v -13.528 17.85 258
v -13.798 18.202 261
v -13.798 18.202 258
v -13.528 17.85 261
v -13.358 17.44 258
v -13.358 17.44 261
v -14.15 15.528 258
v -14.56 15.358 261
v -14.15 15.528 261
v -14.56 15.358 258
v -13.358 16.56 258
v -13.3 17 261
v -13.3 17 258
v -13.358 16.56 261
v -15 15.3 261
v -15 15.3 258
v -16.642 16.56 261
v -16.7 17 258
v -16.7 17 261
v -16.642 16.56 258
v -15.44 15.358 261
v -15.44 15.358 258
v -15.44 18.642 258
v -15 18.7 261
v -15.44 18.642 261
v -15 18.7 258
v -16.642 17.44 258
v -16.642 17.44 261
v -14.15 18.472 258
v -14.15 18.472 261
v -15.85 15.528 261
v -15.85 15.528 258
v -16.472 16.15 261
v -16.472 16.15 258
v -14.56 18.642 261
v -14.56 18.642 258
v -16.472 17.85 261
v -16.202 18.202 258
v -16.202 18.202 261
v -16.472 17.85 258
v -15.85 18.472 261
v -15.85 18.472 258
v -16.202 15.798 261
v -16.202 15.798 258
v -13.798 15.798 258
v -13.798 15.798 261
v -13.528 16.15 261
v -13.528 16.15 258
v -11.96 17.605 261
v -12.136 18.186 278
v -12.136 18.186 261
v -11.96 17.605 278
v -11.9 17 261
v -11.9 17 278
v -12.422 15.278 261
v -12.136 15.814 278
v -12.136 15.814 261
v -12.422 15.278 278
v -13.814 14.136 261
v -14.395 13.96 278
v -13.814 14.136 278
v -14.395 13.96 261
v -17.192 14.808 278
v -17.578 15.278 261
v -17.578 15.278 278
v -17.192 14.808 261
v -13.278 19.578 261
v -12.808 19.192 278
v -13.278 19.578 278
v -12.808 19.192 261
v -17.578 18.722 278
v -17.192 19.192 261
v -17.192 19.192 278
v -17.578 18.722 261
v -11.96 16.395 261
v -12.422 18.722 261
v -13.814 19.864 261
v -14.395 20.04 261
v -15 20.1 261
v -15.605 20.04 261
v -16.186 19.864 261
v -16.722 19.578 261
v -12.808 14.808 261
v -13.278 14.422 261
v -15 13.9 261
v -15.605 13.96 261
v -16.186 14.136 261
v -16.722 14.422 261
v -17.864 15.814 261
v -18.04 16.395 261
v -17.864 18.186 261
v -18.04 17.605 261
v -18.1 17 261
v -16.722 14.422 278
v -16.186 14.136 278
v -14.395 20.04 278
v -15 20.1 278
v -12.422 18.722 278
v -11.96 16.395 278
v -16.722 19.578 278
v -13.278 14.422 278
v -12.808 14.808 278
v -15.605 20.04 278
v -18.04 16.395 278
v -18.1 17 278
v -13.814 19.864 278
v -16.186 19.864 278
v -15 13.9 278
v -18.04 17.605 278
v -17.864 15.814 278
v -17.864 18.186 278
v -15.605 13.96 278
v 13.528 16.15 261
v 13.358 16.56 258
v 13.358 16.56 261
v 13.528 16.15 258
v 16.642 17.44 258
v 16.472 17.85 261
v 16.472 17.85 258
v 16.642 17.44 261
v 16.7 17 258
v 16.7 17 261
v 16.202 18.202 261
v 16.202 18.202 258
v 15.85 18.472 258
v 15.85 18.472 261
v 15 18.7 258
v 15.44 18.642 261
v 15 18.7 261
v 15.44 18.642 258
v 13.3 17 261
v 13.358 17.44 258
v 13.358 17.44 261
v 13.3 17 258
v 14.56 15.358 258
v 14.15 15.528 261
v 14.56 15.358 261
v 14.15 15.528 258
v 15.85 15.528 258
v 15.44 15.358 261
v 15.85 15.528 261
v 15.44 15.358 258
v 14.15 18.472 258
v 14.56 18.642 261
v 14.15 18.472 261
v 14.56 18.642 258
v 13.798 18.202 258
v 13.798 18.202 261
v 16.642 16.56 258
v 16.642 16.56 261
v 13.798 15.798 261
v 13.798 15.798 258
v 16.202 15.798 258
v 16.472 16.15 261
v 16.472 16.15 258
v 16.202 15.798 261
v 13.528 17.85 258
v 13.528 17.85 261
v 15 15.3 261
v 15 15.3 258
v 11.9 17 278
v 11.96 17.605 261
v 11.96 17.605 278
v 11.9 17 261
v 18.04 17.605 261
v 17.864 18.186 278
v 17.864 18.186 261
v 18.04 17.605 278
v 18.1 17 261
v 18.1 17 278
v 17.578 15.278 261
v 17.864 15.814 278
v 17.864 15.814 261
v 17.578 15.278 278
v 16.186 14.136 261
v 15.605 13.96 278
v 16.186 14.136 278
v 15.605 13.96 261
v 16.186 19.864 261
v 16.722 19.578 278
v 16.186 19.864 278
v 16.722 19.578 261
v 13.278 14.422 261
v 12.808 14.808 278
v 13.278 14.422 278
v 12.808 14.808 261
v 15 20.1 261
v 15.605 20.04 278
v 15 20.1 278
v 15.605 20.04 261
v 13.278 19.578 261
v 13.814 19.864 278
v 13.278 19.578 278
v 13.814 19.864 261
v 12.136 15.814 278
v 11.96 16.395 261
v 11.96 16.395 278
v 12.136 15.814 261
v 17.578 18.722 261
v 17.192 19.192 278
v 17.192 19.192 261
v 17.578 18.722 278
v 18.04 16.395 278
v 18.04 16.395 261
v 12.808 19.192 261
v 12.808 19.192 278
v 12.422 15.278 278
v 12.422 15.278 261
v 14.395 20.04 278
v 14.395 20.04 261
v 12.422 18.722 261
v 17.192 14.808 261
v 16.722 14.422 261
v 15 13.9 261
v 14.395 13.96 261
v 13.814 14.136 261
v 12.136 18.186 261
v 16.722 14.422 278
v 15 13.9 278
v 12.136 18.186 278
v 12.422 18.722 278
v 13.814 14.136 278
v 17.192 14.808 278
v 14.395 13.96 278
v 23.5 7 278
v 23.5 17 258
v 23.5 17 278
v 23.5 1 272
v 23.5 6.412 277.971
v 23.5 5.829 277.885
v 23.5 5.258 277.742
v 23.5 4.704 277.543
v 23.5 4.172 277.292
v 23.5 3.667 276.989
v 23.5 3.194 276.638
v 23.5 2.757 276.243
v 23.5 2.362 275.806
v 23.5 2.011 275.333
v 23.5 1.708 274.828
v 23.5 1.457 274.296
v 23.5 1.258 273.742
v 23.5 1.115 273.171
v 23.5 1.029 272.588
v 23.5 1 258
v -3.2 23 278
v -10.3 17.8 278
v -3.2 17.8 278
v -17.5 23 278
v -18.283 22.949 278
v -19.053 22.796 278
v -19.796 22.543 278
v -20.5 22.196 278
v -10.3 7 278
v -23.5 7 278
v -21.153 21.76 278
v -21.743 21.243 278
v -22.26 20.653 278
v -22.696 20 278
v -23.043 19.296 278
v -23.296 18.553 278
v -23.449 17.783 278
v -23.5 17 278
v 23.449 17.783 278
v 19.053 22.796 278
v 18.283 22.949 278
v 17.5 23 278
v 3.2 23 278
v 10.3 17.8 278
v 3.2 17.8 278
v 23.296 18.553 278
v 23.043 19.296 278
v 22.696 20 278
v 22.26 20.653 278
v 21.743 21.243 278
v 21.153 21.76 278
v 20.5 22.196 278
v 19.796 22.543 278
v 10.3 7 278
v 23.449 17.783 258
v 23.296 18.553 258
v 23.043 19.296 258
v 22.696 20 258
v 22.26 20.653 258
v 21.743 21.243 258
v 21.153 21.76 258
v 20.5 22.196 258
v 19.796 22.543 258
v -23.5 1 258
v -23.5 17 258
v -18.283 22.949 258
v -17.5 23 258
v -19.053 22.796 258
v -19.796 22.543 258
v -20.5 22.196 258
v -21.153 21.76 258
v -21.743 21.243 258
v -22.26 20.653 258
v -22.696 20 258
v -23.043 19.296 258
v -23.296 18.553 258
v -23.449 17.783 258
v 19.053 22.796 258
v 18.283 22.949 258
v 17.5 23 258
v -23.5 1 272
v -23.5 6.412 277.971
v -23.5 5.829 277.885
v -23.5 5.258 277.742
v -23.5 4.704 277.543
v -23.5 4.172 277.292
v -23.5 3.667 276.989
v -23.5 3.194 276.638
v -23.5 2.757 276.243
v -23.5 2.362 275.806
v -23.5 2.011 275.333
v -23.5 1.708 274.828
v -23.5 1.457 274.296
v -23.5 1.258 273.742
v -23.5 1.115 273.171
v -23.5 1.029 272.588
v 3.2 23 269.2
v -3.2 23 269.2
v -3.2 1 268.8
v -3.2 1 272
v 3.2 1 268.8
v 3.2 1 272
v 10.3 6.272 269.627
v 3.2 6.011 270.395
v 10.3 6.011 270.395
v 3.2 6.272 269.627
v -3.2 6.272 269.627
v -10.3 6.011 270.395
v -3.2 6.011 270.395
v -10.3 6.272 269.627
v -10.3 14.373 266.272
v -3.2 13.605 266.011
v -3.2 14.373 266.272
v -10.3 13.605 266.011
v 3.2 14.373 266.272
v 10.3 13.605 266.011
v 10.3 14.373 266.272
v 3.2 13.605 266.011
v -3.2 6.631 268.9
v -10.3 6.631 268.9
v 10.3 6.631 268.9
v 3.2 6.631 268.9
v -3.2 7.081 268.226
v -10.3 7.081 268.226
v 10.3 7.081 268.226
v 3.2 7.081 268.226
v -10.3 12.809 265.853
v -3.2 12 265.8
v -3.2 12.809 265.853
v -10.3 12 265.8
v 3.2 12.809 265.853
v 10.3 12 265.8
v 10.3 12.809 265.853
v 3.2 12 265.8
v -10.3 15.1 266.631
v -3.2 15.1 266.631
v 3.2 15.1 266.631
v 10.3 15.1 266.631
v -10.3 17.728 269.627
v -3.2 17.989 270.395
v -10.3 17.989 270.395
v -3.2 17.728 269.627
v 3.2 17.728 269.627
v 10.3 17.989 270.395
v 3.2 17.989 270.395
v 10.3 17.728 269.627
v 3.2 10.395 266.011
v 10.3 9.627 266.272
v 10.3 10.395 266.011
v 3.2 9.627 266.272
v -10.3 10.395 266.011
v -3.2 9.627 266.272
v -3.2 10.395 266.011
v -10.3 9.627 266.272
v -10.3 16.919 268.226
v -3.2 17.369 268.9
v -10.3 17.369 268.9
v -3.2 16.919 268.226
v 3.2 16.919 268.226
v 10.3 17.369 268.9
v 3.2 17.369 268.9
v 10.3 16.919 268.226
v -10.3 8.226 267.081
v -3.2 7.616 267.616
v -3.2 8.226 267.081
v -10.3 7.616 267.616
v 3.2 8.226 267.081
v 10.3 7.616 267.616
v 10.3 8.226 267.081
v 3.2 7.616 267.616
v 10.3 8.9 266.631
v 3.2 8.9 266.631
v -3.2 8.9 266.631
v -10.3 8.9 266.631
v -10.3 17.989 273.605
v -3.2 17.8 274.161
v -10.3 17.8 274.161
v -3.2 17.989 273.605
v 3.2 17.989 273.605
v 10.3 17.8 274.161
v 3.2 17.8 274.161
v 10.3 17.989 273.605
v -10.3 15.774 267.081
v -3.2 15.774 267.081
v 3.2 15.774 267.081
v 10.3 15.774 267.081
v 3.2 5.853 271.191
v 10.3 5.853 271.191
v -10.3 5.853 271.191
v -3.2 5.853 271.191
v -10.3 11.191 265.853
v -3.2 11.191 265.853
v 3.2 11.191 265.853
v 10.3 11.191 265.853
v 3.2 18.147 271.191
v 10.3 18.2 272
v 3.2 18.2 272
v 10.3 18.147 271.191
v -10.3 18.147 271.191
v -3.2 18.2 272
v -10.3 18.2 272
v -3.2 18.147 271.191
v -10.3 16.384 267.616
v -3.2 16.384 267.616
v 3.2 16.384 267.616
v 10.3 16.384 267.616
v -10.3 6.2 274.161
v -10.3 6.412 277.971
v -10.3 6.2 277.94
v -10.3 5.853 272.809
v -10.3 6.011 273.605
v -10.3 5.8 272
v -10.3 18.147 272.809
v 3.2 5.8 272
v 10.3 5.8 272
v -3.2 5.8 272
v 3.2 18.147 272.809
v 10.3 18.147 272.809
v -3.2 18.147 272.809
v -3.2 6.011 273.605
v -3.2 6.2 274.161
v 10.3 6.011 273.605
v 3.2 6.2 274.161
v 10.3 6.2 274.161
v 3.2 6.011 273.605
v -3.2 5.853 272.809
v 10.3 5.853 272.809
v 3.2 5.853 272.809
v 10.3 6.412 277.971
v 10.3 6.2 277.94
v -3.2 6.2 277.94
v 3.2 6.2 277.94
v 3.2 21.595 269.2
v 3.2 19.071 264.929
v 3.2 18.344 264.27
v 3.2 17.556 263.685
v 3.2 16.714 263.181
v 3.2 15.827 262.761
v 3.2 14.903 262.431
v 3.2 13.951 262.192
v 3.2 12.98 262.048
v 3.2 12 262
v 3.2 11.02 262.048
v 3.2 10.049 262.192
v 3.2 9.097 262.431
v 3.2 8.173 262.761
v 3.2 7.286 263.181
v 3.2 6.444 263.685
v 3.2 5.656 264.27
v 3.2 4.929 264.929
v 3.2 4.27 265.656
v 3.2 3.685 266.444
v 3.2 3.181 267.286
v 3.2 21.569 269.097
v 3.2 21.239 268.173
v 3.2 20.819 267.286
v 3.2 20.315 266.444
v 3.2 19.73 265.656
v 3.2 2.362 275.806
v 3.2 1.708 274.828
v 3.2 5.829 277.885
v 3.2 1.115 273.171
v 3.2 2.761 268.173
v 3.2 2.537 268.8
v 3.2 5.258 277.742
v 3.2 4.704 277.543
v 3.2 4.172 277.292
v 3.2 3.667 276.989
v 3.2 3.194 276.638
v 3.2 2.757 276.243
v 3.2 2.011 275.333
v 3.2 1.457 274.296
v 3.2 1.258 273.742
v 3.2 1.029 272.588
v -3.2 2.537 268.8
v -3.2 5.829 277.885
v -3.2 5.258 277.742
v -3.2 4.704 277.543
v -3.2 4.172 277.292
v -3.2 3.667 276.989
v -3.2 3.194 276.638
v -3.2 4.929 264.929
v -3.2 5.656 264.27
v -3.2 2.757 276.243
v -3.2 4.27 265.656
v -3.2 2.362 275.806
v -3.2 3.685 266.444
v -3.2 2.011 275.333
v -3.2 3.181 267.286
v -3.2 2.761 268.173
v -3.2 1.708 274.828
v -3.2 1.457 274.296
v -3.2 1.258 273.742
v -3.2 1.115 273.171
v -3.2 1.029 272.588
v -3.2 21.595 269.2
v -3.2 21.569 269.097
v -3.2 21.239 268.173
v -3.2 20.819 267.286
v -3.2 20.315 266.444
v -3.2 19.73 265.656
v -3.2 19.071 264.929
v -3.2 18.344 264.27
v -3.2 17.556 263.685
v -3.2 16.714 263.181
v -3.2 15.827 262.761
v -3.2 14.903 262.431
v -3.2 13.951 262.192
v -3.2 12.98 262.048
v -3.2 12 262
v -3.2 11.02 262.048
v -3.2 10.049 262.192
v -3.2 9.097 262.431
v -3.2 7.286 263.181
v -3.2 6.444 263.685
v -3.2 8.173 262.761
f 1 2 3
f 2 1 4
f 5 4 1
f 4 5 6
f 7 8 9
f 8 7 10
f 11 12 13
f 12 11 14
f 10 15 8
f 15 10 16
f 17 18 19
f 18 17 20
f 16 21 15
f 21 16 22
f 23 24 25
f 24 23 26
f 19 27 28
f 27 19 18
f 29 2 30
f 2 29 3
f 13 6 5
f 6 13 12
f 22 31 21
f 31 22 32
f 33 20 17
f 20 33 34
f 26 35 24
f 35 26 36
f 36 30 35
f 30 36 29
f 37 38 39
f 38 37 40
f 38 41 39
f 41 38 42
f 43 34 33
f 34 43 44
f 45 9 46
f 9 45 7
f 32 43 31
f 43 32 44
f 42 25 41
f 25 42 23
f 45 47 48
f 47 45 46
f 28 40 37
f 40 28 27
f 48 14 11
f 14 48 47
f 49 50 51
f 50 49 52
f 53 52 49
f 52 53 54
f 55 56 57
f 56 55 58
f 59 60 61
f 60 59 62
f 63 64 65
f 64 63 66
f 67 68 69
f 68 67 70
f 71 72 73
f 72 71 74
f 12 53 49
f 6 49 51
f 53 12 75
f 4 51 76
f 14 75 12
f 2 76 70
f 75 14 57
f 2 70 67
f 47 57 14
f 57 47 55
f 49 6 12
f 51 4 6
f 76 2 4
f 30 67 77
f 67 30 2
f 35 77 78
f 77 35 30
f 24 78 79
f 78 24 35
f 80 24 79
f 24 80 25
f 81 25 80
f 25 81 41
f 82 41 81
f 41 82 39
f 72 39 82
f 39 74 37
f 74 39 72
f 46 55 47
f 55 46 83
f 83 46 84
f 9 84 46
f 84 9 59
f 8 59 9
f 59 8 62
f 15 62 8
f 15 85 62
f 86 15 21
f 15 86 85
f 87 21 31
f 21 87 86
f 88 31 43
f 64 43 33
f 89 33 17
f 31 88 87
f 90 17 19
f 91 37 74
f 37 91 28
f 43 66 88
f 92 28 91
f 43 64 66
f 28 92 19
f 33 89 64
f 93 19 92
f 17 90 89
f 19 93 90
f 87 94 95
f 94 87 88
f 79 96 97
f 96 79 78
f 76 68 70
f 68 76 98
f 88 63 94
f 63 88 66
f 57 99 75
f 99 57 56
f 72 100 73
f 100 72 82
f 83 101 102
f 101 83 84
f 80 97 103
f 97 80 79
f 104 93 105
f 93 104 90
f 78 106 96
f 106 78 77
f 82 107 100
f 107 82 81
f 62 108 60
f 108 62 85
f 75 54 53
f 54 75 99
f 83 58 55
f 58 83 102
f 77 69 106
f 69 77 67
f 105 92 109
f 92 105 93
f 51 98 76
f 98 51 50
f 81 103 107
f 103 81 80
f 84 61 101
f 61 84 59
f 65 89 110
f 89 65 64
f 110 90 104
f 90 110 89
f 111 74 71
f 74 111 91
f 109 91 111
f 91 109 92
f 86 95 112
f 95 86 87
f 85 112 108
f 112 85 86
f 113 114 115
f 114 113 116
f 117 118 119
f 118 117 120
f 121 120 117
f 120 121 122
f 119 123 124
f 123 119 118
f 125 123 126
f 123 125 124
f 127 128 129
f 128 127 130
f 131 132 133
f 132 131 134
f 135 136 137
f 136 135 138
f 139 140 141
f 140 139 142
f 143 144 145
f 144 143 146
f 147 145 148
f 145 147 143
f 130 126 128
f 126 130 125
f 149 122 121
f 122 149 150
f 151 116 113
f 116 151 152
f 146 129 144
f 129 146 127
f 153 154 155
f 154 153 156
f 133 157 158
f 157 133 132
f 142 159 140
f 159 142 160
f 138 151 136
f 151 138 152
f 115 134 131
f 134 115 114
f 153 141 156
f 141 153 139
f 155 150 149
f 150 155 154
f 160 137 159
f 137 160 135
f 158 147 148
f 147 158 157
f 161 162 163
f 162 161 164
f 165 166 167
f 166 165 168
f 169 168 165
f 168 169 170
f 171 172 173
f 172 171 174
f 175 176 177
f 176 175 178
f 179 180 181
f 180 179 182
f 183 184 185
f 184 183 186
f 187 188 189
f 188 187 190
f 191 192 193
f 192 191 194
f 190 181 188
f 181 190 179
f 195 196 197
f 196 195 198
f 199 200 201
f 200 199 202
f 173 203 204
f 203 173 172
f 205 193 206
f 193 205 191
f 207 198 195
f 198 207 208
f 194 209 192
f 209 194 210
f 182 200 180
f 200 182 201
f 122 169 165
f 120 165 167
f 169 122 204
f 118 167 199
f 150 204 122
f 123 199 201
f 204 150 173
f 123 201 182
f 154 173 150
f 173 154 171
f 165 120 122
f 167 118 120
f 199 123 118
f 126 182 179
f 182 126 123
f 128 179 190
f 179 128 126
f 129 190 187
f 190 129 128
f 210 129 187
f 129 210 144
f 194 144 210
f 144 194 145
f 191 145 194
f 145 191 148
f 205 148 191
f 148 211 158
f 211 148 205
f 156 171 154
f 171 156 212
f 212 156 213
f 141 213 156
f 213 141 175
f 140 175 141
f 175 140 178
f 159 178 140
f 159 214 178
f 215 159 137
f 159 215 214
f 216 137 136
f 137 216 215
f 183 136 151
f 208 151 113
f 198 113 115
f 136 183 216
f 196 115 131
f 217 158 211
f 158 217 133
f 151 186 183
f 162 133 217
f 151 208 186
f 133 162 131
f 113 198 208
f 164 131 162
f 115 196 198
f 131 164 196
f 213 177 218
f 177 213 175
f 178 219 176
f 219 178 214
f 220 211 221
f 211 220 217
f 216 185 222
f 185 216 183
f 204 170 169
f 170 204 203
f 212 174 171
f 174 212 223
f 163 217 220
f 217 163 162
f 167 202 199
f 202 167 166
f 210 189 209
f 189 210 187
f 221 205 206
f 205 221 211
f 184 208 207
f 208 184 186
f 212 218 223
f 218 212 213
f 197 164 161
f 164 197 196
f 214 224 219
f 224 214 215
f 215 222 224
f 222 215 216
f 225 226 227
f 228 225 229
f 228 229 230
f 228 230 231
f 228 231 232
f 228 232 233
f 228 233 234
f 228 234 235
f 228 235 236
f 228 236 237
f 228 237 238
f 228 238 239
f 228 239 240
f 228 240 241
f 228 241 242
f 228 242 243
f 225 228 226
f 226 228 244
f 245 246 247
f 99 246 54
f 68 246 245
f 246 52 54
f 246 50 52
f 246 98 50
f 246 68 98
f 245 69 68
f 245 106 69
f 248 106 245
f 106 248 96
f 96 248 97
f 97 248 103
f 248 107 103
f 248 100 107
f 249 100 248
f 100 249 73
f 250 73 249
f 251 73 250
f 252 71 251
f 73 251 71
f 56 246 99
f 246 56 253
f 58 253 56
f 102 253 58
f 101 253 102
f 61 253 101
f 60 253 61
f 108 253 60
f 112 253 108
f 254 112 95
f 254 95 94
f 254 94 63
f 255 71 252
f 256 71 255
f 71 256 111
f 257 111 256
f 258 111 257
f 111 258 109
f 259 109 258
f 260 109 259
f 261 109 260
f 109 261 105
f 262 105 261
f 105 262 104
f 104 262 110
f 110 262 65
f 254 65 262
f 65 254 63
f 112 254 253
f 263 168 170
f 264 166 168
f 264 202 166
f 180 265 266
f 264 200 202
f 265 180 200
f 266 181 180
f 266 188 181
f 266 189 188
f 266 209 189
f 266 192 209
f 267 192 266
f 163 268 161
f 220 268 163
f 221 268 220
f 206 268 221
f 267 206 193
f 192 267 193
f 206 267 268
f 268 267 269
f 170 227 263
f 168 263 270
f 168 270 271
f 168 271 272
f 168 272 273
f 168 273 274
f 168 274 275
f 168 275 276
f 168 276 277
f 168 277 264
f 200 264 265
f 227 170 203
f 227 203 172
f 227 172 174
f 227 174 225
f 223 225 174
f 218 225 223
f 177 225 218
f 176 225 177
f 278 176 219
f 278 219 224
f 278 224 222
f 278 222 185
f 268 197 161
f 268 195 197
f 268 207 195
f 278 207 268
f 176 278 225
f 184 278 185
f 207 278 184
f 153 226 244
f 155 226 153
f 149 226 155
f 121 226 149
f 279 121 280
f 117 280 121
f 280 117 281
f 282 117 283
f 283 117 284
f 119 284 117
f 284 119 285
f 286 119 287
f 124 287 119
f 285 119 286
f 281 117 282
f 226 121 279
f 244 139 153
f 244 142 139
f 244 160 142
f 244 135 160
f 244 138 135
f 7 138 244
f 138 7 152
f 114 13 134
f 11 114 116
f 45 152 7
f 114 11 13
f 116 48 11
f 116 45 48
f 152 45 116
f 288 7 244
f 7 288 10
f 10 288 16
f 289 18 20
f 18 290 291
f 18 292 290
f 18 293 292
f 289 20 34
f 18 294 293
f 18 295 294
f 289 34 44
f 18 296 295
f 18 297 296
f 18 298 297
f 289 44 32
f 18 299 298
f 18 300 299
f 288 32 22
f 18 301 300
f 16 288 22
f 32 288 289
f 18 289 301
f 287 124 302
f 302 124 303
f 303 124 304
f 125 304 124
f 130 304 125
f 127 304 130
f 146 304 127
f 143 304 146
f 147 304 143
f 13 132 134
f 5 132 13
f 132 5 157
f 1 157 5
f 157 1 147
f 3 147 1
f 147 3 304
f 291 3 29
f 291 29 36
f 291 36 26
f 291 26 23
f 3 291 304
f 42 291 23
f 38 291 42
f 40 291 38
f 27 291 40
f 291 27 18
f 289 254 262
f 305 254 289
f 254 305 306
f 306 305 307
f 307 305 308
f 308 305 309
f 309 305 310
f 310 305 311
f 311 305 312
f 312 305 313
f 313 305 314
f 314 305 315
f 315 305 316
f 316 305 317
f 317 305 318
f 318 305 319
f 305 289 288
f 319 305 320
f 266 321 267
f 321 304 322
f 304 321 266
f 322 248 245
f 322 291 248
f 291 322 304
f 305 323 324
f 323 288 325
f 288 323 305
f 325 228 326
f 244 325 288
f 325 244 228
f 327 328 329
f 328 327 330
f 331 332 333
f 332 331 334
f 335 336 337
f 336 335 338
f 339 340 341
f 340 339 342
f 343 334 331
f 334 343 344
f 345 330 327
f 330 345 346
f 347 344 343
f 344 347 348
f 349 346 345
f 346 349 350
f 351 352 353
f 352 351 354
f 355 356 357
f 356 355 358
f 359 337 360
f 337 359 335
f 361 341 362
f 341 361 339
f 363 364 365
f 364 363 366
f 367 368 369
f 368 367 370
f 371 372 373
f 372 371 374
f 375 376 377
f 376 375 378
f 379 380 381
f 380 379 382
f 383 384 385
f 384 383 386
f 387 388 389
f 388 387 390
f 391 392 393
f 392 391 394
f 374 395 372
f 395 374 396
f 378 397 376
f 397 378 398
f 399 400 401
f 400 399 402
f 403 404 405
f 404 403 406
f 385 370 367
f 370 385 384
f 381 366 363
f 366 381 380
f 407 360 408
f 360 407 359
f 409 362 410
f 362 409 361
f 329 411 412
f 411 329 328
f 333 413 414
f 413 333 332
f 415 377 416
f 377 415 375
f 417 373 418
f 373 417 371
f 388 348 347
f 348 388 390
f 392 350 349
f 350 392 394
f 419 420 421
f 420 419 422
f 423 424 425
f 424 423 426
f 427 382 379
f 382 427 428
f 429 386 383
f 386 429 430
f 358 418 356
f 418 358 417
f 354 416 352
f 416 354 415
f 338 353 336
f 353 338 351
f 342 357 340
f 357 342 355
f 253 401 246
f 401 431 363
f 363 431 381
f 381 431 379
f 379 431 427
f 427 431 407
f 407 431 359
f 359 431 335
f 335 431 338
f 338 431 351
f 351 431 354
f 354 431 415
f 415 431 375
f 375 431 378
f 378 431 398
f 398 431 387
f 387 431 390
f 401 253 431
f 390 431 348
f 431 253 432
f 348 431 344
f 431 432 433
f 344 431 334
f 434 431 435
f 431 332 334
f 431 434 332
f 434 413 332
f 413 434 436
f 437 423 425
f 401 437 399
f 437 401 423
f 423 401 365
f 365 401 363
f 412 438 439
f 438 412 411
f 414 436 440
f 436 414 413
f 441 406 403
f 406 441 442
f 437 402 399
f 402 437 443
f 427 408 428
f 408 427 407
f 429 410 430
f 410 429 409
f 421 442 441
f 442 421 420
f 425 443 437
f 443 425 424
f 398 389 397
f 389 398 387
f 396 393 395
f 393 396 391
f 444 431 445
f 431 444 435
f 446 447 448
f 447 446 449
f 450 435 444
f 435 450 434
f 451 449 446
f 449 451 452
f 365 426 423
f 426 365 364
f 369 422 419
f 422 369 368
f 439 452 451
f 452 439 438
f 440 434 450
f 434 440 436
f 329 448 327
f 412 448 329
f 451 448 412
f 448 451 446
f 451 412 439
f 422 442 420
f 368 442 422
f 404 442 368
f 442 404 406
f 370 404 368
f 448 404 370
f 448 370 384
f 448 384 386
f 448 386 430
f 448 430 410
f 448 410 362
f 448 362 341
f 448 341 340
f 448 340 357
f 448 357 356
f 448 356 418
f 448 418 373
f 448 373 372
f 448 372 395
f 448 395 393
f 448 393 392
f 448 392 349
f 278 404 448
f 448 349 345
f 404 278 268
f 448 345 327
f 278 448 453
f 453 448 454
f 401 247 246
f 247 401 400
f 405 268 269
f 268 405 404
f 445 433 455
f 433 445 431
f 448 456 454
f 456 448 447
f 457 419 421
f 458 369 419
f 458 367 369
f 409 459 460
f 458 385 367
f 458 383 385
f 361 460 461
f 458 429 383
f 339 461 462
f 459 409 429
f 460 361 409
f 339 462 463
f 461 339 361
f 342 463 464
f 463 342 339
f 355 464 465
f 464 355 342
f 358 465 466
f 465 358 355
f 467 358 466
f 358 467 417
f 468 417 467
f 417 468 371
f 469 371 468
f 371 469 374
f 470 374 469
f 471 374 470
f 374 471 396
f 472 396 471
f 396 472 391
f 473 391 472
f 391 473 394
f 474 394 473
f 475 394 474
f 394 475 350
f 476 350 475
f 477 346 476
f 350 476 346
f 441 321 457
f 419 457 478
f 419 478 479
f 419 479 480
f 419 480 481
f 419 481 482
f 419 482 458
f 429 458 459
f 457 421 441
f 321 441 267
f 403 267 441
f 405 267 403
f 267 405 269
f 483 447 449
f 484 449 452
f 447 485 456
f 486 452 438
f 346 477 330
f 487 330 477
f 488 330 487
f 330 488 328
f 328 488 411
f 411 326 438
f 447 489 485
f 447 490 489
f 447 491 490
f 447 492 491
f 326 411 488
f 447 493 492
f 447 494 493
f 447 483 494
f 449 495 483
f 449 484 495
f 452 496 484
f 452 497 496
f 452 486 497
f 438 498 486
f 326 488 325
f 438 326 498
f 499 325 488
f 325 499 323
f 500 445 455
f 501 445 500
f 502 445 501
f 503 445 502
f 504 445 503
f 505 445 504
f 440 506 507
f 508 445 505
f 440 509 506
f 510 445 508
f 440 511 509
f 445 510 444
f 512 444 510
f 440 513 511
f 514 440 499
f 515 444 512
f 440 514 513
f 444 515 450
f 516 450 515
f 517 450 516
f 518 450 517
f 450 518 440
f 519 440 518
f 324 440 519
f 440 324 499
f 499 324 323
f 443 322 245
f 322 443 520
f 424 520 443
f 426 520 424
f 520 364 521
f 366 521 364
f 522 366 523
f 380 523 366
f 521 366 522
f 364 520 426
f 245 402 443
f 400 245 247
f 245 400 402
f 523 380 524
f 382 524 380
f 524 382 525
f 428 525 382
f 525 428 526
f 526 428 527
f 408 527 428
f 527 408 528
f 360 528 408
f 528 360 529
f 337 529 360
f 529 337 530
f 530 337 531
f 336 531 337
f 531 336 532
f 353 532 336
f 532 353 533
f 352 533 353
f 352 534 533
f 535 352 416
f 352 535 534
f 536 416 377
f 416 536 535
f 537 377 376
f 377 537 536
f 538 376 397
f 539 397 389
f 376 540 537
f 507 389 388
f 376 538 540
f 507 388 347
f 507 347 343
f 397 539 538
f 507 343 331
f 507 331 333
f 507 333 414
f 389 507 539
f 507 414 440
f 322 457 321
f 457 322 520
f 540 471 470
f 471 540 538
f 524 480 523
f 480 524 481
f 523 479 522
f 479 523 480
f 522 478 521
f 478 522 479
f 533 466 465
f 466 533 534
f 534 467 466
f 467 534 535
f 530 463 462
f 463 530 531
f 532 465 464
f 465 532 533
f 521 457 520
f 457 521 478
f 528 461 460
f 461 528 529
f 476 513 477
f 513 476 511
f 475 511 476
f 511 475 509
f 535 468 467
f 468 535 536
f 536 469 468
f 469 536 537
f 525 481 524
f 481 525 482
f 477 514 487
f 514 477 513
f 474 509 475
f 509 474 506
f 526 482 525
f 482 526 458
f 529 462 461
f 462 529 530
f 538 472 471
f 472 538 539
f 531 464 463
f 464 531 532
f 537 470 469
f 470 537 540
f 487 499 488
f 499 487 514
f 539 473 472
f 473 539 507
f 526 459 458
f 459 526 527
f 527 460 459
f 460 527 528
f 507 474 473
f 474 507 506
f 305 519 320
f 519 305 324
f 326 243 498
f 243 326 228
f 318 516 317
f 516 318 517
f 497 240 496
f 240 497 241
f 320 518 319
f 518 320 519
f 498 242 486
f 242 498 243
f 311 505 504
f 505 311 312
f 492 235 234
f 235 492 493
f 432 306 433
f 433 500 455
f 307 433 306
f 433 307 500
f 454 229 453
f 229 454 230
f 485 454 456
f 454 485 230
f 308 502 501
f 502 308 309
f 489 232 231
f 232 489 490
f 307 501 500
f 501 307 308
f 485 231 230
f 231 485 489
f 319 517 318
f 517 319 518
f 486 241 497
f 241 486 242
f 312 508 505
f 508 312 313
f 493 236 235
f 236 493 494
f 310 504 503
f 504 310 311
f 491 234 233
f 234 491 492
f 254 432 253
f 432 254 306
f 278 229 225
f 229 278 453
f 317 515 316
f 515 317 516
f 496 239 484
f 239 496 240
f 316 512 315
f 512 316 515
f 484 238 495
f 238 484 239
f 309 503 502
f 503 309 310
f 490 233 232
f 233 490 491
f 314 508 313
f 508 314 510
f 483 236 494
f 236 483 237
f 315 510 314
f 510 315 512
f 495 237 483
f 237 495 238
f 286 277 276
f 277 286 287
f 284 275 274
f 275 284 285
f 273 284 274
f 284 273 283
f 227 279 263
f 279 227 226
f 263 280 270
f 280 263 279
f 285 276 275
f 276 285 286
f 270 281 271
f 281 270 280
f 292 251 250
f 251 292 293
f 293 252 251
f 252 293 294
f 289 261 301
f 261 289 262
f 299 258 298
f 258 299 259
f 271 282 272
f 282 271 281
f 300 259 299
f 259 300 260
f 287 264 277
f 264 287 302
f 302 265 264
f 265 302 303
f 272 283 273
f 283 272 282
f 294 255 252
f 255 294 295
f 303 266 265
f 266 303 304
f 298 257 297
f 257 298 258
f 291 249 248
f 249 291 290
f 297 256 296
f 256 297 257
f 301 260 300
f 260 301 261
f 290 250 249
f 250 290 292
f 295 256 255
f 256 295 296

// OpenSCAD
// 2026-11-04: the swing-latch saddle on its own (v3), for viewing. Source: 2026-11-03_swing_latch.scad.
use <2026-11-03_swing_latch.scad>
color([0.95, 0.55, 0.1]) saddle();
